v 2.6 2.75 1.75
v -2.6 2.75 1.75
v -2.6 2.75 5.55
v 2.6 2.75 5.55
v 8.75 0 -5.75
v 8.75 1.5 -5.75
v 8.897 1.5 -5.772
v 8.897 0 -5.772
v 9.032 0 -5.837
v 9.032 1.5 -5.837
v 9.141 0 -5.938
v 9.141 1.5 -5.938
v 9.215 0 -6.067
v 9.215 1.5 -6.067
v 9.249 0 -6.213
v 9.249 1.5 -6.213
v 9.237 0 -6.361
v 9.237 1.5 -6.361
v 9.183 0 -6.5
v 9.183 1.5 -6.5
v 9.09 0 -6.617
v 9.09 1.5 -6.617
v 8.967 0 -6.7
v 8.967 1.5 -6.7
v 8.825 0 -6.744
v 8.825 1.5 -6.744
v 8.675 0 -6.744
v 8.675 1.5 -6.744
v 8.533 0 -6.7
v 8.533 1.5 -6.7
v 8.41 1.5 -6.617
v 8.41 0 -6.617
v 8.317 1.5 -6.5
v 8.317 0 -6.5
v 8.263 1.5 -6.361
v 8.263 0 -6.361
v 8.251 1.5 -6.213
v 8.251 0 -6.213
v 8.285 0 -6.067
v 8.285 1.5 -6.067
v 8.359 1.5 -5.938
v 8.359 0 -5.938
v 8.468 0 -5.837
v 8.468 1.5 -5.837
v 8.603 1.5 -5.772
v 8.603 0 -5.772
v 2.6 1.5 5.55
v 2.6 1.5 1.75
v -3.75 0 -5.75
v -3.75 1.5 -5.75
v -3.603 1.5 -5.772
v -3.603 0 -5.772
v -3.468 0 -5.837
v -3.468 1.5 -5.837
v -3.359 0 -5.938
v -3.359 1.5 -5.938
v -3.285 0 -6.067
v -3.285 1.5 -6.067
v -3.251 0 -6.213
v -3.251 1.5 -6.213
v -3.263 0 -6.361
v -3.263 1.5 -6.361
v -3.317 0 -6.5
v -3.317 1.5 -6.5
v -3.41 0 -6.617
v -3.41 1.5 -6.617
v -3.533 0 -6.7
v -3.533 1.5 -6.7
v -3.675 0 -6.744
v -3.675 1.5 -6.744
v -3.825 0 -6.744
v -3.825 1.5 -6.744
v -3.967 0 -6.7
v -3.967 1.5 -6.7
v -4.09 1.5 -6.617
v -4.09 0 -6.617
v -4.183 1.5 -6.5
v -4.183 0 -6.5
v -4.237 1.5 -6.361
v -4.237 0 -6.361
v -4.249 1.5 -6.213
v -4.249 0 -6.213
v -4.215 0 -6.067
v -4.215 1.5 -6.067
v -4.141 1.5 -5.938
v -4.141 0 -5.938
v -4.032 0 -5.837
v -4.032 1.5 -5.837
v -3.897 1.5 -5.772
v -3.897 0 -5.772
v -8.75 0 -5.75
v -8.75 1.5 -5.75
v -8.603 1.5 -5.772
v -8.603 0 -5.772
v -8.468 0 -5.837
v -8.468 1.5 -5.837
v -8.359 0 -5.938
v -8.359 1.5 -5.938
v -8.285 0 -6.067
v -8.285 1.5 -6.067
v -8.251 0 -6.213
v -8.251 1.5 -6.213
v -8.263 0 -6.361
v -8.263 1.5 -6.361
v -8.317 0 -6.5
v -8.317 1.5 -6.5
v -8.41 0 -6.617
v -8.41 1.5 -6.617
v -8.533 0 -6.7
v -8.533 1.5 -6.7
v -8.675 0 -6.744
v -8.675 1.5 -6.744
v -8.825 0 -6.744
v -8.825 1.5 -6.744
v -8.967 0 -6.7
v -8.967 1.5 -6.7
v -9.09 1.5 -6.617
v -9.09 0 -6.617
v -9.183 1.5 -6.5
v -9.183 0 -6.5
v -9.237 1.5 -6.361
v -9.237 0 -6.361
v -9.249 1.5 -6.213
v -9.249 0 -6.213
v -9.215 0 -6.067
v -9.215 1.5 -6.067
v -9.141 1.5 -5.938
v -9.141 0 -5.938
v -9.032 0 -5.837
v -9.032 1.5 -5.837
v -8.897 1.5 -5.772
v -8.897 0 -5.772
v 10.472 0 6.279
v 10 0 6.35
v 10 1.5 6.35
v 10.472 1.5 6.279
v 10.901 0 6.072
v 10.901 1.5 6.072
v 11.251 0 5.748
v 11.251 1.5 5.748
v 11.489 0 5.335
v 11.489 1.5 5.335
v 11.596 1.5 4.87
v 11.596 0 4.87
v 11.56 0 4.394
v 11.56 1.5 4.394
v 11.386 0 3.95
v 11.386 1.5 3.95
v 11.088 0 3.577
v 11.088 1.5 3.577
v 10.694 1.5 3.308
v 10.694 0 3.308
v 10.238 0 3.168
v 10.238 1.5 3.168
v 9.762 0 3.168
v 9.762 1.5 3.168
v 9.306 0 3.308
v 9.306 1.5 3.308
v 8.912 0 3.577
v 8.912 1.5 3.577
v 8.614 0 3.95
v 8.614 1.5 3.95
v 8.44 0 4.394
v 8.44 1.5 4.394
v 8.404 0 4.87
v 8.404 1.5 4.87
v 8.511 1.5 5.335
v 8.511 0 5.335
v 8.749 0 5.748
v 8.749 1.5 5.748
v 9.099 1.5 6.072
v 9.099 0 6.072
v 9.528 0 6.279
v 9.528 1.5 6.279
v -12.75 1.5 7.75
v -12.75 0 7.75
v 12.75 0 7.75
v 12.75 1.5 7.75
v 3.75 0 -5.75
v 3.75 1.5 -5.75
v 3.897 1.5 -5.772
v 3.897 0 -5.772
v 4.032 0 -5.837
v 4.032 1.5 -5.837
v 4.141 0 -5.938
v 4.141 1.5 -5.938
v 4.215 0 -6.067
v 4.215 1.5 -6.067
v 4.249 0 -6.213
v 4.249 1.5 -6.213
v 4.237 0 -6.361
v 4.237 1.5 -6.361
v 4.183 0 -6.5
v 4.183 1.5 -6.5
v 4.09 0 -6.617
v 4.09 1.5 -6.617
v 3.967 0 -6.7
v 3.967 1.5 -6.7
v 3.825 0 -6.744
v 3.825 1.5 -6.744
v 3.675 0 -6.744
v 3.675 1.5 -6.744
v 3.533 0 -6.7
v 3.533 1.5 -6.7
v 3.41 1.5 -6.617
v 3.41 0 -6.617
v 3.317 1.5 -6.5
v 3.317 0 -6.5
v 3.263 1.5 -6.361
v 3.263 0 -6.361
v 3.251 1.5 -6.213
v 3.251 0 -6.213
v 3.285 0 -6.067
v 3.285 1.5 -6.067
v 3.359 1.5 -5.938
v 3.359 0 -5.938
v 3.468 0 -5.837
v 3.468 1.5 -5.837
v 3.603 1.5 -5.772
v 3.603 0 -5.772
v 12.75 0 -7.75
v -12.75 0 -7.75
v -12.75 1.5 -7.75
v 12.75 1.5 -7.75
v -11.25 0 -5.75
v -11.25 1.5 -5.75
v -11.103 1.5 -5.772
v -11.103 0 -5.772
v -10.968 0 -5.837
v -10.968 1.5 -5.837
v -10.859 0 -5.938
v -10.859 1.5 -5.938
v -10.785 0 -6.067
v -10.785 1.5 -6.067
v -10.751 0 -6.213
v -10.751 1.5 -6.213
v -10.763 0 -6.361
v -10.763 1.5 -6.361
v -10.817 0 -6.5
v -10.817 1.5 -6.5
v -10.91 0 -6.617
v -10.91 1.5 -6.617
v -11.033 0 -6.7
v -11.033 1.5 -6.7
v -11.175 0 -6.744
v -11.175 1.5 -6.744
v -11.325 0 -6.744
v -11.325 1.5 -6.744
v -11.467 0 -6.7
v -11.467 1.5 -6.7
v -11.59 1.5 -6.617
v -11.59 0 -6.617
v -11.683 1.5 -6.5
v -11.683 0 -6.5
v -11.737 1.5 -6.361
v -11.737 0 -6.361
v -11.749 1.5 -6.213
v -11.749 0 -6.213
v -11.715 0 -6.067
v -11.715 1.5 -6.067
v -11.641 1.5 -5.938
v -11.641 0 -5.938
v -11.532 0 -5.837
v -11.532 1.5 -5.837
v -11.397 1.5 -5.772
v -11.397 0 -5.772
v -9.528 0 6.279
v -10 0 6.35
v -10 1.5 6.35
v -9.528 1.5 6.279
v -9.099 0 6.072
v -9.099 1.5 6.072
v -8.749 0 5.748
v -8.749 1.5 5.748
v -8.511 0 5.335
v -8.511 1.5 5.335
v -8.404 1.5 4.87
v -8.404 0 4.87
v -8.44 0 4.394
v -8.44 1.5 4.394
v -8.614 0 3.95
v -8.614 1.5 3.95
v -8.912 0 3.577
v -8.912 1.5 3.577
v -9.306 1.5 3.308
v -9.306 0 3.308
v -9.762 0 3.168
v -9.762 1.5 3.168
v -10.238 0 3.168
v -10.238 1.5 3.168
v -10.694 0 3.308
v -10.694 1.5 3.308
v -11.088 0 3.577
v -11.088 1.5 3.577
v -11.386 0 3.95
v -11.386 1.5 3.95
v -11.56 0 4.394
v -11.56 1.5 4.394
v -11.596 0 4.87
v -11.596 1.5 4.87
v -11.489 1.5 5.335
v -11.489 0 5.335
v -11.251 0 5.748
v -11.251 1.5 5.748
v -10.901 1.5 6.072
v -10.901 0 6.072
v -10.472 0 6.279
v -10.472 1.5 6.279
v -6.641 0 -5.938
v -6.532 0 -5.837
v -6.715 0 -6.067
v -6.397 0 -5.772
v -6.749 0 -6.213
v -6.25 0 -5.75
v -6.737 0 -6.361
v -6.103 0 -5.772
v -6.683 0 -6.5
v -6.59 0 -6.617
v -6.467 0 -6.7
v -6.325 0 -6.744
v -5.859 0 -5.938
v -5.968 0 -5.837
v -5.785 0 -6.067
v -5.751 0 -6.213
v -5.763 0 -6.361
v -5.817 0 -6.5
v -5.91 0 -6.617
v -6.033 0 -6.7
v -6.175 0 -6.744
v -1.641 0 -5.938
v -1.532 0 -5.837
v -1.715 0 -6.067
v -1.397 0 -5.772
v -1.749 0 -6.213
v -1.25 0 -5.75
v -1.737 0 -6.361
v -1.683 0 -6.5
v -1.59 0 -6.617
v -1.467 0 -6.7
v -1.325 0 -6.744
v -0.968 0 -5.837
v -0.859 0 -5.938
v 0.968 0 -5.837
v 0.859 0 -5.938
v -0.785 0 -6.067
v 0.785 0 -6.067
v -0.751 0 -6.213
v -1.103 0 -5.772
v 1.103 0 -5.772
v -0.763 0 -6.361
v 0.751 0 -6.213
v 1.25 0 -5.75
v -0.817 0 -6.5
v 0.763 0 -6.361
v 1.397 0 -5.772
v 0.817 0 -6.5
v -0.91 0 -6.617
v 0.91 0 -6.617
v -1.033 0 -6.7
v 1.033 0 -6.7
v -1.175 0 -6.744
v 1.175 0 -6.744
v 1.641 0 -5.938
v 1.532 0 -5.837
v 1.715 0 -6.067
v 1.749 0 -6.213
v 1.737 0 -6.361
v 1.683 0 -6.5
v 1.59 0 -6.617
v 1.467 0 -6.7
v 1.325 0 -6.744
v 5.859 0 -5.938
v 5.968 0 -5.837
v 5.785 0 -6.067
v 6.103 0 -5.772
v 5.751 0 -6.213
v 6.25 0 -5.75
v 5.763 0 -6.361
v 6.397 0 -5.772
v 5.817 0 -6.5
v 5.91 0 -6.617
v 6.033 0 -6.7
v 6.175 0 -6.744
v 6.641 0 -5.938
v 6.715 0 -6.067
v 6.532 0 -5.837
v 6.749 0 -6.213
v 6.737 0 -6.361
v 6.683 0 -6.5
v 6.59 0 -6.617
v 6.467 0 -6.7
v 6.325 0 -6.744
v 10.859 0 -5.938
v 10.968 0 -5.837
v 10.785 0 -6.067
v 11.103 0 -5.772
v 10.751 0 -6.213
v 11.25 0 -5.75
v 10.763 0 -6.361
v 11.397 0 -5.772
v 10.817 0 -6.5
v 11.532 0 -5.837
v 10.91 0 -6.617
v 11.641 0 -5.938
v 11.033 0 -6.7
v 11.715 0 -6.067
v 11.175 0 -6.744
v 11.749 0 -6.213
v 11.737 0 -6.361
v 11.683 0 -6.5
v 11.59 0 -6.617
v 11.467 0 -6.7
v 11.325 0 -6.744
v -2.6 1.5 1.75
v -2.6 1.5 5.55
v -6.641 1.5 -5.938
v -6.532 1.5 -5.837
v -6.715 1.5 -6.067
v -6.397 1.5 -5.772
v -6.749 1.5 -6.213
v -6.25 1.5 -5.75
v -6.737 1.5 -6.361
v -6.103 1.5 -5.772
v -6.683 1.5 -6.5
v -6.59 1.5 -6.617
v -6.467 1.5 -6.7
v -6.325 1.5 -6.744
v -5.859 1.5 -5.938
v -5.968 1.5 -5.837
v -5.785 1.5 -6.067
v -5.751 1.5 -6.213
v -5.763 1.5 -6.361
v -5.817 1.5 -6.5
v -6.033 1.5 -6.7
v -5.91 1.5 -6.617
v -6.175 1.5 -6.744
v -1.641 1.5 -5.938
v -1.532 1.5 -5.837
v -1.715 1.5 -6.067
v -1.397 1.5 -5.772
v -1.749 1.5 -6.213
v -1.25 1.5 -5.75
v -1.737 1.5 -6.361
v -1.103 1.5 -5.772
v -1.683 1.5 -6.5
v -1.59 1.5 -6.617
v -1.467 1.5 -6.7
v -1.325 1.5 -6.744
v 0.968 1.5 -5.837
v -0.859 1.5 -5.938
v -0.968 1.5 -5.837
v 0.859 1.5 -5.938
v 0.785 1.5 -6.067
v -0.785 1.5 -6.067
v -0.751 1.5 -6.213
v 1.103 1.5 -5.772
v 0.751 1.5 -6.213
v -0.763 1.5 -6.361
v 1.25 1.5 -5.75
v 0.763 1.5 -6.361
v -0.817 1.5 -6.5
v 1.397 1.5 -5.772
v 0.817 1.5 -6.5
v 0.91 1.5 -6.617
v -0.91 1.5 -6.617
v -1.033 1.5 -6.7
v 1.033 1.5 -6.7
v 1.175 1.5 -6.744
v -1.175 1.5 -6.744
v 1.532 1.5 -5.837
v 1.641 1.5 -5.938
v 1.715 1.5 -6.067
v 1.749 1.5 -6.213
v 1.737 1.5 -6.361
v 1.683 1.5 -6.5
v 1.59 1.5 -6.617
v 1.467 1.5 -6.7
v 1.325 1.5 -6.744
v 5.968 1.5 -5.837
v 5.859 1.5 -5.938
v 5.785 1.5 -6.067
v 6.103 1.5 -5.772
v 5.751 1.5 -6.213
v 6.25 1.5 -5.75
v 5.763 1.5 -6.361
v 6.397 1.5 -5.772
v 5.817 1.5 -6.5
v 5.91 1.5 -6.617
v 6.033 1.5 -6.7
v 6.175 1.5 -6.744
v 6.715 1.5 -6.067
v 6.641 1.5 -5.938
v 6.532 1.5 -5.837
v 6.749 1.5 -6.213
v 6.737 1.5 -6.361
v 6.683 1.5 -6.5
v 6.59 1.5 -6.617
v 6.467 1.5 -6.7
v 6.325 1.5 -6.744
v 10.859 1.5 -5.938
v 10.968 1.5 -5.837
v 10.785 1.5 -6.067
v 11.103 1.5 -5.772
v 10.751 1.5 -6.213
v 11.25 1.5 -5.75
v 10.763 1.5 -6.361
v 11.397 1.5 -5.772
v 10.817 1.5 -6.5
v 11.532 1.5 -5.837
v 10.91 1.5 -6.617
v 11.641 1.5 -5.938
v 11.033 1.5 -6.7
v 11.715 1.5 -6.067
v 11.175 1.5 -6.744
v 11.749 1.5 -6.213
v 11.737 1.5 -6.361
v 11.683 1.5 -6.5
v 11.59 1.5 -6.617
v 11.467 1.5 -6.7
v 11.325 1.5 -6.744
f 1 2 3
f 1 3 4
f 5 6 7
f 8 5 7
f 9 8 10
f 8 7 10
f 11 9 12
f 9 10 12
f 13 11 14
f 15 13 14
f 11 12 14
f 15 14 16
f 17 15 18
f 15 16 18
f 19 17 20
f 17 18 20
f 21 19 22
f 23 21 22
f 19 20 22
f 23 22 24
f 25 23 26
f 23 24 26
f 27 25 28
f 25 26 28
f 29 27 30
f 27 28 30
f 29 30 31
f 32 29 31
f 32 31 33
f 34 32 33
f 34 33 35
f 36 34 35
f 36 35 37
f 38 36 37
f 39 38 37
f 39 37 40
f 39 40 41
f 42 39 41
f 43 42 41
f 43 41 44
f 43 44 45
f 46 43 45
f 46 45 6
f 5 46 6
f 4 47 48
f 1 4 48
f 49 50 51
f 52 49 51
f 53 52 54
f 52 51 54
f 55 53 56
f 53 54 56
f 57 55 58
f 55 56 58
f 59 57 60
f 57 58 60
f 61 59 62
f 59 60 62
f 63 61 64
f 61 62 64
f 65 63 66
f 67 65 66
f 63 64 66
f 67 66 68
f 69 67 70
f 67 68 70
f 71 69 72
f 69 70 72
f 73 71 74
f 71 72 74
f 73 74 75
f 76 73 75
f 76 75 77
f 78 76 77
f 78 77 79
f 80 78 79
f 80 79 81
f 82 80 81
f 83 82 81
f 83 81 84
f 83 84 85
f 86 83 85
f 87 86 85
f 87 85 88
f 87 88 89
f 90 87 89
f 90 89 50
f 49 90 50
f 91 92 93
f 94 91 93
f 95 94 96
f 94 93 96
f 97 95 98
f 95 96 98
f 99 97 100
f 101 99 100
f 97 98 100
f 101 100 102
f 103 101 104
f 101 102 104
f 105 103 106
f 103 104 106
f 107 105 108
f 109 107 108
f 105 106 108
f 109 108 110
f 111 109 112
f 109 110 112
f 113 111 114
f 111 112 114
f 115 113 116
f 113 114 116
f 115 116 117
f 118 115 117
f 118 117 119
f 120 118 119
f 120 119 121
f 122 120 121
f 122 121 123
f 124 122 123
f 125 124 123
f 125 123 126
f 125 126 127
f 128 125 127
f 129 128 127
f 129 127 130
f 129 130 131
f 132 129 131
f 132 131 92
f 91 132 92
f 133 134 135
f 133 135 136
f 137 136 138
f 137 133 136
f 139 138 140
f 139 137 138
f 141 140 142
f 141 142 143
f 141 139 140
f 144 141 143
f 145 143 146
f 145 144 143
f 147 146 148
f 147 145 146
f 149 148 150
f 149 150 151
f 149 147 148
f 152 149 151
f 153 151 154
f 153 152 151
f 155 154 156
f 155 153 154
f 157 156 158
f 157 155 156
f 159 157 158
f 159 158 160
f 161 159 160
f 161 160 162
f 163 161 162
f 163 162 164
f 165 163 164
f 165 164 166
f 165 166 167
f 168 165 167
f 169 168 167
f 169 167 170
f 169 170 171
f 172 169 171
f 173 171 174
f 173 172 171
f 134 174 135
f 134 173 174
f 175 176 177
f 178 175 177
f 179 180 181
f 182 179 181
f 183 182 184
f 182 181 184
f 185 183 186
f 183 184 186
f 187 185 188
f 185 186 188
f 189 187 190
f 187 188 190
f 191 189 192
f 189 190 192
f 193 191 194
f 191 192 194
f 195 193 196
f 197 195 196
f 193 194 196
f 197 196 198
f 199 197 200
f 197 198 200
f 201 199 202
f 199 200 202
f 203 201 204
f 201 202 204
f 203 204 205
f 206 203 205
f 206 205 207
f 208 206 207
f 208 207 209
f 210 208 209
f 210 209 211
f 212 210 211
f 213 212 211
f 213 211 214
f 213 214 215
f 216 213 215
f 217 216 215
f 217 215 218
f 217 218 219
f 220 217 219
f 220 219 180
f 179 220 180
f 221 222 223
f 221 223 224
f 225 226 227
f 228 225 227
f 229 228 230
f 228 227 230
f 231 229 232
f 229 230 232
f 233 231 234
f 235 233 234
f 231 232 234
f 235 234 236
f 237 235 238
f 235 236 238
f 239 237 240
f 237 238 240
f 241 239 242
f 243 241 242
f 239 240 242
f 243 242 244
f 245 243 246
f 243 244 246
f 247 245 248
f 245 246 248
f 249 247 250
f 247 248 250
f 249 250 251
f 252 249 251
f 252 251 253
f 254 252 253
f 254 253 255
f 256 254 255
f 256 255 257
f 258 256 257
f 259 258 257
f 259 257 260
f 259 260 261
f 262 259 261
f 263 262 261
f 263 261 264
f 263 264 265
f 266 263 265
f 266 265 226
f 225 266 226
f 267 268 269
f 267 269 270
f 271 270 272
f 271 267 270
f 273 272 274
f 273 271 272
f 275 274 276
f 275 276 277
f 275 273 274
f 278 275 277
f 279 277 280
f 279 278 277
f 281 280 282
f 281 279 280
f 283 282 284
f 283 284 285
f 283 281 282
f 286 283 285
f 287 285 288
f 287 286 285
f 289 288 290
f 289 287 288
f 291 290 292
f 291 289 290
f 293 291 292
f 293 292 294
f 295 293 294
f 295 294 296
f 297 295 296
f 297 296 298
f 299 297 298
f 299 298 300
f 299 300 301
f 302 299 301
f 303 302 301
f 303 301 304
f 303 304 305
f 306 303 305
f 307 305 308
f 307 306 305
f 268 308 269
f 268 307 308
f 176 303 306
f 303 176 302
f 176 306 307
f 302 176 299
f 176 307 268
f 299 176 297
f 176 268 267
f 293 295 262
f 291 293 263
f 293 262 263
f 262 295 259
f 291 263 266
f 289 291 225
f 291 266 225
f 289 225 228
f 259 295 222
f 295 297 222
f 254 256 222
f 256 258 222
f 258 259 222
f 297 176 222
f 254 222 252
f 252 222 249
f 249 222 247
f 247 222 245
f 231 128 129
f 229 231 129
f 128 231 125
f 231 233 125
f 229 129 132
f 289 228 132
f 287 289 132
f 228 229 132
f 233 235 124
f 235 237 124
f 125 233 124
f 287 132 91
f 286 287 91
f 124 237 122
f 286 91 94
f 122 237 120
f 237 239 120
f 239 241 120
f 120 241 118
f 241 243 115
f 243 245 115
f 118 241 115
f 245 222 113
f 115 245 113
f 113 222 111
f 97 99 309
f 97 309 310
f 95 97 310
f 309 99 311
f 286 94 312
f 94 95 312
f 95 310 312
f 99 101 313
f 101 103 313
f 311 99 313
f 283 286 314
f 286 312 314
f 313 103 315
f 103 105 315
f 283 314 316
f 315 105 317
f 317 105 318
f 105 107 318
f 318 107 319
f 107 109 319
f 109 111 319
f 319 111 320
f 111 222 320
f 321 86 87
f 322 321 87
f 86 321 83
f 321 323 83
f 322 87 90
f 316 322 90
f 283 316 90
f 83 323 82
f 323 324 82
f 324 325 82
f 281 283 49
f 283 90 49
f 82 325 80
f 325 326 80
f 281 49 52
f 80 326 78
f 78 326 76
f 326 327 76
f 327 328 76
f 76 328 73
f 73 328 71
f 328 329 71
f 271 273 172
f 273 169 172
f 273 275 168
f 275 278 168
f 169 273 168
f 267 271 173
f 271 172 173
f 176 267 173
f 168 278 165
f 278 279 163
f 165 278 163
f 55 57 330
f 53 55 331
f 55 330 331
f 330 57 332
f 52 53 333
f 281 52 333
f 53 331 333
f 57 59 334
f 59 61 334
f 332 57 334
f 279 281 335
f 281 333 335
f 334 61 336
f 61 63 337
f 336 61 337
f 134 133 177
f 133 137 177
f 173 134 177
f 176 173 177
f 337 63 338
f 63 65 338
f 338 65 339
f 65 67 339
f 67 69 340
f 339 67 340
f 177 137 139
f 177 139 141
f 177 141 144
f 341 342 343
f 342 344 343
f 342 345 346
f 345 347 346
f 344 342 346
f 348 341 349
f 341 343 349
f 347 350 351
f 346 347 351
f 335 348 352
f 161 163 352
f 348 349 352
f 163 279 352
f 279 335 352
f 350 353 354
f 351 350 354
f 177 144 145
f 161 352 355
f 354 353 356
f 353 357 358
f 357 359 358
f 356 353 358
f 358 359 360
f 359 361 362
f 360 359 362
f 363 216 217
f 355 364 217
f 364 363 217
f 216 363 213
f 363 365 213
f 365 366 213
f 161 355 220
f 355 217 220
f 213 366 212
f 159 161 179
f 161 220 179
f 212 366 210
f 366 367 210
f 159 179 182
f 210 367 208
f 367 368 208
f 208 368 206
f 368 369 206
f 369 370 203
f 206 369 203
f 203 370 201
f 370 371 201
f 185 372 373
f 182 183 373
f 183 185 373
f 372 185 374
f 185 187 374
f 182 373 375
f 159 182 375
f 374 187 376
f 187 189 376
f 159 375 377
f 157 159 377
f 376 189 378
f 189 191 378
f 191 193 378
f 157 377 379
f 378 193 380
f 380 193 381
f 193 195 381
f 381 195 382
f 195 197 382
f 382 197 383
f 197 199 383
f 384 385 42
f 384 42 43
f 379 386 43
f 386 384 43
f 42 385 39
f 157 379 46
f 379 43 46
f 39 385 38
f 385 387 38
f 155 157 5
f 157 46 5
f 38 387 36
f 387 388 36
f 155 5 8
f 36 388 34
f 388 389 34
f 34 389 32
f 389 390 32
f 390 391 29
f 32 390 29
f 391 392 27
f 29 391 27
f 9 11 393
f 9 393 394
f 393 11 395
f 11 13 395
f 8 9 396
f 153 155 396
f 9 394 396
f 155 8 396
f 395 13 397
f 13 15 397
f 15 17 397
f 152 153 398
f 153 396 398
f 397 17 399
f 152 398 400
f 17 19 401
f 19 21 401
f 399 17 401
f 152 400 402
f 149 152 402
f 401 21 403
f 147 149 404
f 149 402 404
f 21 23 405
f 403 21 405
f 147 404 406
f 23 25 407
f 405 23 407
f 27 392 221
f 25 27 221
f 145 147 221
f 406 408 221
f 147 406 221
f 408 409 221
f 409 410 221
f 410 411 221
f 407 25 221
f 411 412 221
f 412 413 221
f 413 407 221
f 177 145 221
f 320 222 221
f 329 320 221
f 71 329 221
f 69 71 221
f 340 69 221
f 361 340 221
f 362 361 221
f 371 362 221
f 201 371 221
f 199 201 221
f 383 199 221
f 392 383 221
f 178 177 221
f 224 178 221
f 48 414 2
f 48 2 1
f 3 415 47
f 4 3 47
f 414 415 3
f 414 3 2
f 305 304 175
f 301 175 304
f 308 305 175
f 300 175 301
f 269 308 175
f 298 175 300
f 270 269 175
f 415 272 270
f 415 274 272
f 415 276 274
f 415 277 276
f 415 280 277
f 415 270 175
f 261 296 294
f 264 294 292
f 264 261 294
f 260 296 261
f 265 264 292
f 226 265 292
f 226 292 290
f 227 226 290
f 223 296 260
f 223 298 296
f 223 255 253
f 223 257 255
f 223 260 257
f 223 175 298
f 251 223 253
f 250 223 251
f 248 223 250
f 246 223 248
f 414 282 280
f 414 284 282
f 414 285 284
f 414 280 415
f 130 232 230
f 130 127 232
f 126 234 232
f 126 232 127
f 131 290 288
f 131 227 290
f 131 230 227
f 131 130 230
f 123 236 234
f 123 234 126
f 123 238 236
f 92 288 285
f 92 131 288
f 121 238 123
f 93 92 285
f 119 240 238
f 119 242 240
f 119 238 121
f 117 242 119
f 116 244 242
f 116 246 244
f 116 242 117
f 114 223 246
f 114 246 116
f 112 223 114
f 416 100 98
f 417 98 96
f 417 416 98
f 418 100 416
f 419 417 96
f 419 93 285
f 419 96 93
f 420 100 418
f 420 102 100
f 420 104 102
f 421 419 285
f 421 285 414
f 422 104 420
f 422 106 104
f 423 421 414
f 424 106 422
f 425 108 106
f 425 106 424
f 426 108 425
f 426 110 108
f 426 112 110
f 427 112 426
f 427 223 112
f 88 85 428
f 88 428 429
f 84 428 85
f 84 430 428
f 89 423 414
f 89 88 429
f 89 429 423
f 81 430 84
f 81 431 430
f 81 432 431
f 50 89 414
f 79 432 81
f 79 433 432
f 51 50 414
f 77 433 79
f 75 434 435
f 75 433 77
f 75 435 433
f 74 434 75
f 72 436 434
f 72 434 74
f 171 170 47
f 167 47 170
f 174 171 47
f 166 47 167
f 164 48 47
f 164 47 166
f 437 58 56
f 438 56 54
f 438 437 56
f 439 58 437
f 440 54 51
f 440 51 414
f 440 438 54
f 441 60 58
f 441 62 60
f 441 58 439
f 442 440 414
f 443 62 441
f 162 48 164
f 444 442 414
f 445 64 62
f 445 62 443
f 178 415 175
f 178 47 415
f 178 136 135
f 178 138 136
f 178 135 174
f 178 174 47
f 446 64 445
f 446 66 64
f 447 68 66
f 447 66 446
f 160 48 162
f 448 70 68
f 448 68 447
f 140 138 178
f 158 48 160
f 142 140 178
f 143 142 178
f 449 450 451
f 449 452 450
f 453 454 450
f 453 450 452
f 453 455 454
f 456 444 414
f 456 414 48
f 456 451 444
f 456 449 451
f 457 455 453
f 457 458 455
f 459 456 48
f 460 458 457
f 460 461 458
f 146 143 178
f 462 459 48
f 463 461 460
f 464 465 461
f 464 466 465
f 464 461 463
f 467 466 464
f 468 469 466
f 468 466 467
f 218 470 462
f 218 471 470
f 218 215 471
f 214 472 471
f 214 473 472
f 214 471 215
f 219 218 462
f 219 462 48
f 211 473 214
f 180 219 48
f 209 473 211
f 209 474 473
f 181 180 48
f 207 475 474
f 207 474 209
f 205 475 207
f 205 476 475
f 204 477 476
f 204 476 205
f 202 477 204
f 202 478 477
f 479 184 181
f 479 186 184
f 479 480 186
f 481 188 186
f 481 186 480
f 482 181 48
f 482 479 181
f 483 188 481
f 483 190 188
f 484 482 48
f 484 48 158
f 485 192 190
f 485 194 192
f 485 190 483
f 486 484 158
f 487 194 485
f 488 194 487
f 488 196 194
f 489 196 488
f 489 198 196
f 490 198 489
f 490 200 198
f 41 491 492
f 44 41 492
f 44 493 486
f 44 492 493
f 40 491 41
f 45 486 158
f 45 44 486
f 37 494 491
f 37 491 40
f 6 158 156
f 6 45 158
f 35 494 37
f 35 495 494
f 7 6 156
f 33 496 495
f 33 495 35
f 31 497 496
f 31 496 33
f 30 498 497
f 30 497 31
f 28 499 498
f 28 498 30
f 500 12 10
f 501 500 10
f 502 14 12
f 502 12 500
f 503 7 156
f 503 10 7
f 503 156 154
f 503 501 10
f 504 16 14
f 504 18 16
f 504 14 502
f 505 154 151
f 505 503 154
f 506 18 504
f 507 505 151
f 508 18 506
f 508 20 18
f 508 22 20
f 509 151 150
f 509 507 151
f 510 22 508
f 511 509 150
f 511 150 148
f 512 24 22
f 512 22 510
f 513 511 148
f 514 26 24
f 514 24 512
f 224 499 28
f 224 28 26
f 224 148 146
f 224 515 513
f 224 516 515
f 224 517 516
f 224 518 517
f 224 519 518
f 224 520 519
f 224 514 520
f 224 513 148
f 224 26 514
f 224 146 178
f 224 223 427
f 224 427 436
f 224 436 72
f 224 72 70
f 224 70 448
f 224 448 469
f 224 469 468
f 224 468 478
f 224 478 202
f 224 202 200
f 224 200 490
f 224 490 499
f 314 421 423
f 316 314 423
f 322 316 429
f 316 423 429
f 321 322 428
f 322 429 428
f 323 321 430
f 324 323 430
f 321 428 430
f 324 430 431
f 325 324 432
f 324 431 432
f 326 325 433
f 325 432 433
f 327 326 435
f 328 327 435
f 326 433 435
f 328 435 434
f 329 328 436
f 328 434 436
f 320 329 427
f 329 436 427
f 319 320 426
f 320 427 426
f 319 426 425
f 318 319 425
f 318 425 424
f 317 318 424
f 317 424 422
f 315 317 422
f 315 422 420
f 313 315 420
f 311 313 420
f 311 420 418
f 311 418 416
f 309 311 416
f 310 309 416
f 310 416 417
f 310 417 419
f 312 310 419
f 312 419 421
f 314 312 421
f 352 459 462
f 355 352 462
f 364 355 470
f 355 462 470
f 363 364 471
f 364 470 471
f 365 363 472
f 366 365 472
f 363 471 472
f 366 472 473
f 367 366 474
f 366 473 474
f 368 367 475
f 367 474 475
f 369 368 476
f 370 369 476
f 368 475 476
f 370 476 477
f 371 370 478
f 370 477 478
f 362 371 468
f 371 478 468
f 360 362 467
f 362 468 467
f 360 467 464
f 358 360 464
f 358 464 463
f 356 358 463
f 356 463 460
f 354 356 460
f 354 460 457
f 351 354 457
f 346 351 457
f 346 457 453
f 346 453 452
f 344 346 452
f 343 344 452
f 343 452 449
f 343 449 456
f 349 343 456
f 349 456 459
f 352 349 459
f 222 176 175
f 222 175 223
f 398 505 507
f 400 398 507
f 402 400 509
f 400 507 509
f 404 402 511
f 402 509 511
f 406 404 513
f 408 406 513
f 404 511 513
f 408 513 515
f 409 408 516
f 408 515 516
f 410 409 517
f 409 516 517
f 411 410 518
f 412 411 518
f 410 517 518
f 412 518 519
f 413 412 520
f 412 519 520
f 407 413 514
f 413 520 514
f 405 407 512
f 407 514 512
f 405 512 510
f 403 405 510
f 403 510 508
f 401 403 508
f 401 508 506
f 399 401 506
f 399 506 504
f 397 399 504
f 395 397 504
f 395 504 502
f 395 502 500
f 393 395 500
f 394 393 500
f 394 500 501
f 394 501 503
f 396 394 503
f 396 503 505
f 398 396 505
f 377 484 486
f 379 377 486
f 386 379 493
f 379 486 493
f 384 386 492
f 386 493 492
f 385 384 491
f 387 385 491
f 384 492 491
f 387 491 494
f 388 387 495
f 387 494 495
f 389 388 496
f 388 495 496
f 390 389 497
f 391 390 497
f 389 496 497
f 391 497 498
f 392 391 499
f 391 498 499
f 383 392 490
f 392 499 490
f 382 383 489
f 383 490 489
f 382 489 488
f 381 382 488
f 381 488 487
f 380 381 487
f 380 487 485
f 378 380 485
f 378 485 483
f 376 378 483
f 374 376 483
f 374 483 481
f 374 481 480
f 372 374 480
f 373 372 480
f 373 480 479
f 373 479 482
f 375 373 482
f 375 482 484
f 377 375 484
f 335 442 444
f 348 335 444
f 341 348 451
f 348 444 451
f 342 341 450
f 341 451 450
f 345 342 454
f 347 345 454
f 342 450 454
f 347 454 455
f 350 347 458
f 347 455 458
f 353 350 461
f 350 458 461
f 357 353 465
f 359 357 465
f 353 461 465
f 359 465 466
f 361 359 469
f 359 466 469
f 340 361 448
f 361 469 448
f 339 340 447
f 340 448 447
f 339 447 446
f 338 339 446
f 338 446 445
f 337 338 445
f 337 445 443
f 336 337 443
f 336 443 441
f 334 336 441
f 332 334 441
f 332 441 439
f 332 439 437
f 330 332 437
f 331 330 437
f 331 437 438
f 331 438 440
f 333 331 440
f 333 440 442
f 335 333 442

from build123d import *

# Parameters (mm, degrees)
SKETCH1_W           = 25.5
SKETCH1_H           = 15.5
SKETCH1_R           = 1.6
BOSS_EXTRUDE1_DEPTH = 1.5
SKETCH2_W           = 5.2
SKETCH2_H           = 3.8
BOSS_EXTRUDE2_DEPTH = 1.25
SKETCH3_R           = 0.5
CUT_EXTRUDE1_DEPTH  = 15.995832754
LPATTERN1_COUNT     = 10
LPATTERN1_PITCH     = 2.5


with BuildPart() as part:
    # Sketch1 → Boss-Extrude1 (new body)
    with BuildSketch(Plane(origin=(0, 0, 0), x_dir=(1, 0, 0), z_dir=(0, 1, 0))):
        Rectangle(SKETCH1_W, SKETCH1_H)
        with Locations(Location((-10, -4.75, 0), (0, 0, 270))):
            Circle(SKETCH1_R, mode=Mode.SUBTRACT)
        with Locations(Location((10, -4.75, 0), (0, 0, 270))):
            Circle(SKETCH1_R, mode=Mode.SUBTRACT)
    extrude(amount=BOSS_EXTRUDE1_DEPTH)

    # Sketch2 → Boss-Extrude2 (add)
    with BuildSketch(Plane(origin=(0, 1.5, 0), x_dir=(1, 0, 0), z_dir=(0, 1, 0))):
        with Locations((0, -3.65)):
            Rectangle(SKETCH2_W, SKETCH2_H)
    extrude(amount=BOSS_EXTRUDE2_DEPTH)

    # Sketch3 → Cut-Extrude1 (cut, through all)
    with BuildSketch(Plane(origin=(0, 1.5, 0), x_dir=(1, 0, 0), z_dir=(0, 1, 0))):
        with Locations(Location((-11.25, 6.25, 0), (0, 0, 270))):
            Circle(SKETCH3_R)
    cut_extrude1 = extrude(amount=-CUT_EXTRUDE1_DEPTH, mode=Mode.SUBTRACT)

    # LPattern1: Cut-Extrude1 ×10
    with Locations(*[(i * LPATTERN1_PITCH, 0, 0) for i in range(1, LPATTERN1_COUNT)]):
        add(cut_extrude1, mode=Mode.SUBTRACT)


solid = part.part
